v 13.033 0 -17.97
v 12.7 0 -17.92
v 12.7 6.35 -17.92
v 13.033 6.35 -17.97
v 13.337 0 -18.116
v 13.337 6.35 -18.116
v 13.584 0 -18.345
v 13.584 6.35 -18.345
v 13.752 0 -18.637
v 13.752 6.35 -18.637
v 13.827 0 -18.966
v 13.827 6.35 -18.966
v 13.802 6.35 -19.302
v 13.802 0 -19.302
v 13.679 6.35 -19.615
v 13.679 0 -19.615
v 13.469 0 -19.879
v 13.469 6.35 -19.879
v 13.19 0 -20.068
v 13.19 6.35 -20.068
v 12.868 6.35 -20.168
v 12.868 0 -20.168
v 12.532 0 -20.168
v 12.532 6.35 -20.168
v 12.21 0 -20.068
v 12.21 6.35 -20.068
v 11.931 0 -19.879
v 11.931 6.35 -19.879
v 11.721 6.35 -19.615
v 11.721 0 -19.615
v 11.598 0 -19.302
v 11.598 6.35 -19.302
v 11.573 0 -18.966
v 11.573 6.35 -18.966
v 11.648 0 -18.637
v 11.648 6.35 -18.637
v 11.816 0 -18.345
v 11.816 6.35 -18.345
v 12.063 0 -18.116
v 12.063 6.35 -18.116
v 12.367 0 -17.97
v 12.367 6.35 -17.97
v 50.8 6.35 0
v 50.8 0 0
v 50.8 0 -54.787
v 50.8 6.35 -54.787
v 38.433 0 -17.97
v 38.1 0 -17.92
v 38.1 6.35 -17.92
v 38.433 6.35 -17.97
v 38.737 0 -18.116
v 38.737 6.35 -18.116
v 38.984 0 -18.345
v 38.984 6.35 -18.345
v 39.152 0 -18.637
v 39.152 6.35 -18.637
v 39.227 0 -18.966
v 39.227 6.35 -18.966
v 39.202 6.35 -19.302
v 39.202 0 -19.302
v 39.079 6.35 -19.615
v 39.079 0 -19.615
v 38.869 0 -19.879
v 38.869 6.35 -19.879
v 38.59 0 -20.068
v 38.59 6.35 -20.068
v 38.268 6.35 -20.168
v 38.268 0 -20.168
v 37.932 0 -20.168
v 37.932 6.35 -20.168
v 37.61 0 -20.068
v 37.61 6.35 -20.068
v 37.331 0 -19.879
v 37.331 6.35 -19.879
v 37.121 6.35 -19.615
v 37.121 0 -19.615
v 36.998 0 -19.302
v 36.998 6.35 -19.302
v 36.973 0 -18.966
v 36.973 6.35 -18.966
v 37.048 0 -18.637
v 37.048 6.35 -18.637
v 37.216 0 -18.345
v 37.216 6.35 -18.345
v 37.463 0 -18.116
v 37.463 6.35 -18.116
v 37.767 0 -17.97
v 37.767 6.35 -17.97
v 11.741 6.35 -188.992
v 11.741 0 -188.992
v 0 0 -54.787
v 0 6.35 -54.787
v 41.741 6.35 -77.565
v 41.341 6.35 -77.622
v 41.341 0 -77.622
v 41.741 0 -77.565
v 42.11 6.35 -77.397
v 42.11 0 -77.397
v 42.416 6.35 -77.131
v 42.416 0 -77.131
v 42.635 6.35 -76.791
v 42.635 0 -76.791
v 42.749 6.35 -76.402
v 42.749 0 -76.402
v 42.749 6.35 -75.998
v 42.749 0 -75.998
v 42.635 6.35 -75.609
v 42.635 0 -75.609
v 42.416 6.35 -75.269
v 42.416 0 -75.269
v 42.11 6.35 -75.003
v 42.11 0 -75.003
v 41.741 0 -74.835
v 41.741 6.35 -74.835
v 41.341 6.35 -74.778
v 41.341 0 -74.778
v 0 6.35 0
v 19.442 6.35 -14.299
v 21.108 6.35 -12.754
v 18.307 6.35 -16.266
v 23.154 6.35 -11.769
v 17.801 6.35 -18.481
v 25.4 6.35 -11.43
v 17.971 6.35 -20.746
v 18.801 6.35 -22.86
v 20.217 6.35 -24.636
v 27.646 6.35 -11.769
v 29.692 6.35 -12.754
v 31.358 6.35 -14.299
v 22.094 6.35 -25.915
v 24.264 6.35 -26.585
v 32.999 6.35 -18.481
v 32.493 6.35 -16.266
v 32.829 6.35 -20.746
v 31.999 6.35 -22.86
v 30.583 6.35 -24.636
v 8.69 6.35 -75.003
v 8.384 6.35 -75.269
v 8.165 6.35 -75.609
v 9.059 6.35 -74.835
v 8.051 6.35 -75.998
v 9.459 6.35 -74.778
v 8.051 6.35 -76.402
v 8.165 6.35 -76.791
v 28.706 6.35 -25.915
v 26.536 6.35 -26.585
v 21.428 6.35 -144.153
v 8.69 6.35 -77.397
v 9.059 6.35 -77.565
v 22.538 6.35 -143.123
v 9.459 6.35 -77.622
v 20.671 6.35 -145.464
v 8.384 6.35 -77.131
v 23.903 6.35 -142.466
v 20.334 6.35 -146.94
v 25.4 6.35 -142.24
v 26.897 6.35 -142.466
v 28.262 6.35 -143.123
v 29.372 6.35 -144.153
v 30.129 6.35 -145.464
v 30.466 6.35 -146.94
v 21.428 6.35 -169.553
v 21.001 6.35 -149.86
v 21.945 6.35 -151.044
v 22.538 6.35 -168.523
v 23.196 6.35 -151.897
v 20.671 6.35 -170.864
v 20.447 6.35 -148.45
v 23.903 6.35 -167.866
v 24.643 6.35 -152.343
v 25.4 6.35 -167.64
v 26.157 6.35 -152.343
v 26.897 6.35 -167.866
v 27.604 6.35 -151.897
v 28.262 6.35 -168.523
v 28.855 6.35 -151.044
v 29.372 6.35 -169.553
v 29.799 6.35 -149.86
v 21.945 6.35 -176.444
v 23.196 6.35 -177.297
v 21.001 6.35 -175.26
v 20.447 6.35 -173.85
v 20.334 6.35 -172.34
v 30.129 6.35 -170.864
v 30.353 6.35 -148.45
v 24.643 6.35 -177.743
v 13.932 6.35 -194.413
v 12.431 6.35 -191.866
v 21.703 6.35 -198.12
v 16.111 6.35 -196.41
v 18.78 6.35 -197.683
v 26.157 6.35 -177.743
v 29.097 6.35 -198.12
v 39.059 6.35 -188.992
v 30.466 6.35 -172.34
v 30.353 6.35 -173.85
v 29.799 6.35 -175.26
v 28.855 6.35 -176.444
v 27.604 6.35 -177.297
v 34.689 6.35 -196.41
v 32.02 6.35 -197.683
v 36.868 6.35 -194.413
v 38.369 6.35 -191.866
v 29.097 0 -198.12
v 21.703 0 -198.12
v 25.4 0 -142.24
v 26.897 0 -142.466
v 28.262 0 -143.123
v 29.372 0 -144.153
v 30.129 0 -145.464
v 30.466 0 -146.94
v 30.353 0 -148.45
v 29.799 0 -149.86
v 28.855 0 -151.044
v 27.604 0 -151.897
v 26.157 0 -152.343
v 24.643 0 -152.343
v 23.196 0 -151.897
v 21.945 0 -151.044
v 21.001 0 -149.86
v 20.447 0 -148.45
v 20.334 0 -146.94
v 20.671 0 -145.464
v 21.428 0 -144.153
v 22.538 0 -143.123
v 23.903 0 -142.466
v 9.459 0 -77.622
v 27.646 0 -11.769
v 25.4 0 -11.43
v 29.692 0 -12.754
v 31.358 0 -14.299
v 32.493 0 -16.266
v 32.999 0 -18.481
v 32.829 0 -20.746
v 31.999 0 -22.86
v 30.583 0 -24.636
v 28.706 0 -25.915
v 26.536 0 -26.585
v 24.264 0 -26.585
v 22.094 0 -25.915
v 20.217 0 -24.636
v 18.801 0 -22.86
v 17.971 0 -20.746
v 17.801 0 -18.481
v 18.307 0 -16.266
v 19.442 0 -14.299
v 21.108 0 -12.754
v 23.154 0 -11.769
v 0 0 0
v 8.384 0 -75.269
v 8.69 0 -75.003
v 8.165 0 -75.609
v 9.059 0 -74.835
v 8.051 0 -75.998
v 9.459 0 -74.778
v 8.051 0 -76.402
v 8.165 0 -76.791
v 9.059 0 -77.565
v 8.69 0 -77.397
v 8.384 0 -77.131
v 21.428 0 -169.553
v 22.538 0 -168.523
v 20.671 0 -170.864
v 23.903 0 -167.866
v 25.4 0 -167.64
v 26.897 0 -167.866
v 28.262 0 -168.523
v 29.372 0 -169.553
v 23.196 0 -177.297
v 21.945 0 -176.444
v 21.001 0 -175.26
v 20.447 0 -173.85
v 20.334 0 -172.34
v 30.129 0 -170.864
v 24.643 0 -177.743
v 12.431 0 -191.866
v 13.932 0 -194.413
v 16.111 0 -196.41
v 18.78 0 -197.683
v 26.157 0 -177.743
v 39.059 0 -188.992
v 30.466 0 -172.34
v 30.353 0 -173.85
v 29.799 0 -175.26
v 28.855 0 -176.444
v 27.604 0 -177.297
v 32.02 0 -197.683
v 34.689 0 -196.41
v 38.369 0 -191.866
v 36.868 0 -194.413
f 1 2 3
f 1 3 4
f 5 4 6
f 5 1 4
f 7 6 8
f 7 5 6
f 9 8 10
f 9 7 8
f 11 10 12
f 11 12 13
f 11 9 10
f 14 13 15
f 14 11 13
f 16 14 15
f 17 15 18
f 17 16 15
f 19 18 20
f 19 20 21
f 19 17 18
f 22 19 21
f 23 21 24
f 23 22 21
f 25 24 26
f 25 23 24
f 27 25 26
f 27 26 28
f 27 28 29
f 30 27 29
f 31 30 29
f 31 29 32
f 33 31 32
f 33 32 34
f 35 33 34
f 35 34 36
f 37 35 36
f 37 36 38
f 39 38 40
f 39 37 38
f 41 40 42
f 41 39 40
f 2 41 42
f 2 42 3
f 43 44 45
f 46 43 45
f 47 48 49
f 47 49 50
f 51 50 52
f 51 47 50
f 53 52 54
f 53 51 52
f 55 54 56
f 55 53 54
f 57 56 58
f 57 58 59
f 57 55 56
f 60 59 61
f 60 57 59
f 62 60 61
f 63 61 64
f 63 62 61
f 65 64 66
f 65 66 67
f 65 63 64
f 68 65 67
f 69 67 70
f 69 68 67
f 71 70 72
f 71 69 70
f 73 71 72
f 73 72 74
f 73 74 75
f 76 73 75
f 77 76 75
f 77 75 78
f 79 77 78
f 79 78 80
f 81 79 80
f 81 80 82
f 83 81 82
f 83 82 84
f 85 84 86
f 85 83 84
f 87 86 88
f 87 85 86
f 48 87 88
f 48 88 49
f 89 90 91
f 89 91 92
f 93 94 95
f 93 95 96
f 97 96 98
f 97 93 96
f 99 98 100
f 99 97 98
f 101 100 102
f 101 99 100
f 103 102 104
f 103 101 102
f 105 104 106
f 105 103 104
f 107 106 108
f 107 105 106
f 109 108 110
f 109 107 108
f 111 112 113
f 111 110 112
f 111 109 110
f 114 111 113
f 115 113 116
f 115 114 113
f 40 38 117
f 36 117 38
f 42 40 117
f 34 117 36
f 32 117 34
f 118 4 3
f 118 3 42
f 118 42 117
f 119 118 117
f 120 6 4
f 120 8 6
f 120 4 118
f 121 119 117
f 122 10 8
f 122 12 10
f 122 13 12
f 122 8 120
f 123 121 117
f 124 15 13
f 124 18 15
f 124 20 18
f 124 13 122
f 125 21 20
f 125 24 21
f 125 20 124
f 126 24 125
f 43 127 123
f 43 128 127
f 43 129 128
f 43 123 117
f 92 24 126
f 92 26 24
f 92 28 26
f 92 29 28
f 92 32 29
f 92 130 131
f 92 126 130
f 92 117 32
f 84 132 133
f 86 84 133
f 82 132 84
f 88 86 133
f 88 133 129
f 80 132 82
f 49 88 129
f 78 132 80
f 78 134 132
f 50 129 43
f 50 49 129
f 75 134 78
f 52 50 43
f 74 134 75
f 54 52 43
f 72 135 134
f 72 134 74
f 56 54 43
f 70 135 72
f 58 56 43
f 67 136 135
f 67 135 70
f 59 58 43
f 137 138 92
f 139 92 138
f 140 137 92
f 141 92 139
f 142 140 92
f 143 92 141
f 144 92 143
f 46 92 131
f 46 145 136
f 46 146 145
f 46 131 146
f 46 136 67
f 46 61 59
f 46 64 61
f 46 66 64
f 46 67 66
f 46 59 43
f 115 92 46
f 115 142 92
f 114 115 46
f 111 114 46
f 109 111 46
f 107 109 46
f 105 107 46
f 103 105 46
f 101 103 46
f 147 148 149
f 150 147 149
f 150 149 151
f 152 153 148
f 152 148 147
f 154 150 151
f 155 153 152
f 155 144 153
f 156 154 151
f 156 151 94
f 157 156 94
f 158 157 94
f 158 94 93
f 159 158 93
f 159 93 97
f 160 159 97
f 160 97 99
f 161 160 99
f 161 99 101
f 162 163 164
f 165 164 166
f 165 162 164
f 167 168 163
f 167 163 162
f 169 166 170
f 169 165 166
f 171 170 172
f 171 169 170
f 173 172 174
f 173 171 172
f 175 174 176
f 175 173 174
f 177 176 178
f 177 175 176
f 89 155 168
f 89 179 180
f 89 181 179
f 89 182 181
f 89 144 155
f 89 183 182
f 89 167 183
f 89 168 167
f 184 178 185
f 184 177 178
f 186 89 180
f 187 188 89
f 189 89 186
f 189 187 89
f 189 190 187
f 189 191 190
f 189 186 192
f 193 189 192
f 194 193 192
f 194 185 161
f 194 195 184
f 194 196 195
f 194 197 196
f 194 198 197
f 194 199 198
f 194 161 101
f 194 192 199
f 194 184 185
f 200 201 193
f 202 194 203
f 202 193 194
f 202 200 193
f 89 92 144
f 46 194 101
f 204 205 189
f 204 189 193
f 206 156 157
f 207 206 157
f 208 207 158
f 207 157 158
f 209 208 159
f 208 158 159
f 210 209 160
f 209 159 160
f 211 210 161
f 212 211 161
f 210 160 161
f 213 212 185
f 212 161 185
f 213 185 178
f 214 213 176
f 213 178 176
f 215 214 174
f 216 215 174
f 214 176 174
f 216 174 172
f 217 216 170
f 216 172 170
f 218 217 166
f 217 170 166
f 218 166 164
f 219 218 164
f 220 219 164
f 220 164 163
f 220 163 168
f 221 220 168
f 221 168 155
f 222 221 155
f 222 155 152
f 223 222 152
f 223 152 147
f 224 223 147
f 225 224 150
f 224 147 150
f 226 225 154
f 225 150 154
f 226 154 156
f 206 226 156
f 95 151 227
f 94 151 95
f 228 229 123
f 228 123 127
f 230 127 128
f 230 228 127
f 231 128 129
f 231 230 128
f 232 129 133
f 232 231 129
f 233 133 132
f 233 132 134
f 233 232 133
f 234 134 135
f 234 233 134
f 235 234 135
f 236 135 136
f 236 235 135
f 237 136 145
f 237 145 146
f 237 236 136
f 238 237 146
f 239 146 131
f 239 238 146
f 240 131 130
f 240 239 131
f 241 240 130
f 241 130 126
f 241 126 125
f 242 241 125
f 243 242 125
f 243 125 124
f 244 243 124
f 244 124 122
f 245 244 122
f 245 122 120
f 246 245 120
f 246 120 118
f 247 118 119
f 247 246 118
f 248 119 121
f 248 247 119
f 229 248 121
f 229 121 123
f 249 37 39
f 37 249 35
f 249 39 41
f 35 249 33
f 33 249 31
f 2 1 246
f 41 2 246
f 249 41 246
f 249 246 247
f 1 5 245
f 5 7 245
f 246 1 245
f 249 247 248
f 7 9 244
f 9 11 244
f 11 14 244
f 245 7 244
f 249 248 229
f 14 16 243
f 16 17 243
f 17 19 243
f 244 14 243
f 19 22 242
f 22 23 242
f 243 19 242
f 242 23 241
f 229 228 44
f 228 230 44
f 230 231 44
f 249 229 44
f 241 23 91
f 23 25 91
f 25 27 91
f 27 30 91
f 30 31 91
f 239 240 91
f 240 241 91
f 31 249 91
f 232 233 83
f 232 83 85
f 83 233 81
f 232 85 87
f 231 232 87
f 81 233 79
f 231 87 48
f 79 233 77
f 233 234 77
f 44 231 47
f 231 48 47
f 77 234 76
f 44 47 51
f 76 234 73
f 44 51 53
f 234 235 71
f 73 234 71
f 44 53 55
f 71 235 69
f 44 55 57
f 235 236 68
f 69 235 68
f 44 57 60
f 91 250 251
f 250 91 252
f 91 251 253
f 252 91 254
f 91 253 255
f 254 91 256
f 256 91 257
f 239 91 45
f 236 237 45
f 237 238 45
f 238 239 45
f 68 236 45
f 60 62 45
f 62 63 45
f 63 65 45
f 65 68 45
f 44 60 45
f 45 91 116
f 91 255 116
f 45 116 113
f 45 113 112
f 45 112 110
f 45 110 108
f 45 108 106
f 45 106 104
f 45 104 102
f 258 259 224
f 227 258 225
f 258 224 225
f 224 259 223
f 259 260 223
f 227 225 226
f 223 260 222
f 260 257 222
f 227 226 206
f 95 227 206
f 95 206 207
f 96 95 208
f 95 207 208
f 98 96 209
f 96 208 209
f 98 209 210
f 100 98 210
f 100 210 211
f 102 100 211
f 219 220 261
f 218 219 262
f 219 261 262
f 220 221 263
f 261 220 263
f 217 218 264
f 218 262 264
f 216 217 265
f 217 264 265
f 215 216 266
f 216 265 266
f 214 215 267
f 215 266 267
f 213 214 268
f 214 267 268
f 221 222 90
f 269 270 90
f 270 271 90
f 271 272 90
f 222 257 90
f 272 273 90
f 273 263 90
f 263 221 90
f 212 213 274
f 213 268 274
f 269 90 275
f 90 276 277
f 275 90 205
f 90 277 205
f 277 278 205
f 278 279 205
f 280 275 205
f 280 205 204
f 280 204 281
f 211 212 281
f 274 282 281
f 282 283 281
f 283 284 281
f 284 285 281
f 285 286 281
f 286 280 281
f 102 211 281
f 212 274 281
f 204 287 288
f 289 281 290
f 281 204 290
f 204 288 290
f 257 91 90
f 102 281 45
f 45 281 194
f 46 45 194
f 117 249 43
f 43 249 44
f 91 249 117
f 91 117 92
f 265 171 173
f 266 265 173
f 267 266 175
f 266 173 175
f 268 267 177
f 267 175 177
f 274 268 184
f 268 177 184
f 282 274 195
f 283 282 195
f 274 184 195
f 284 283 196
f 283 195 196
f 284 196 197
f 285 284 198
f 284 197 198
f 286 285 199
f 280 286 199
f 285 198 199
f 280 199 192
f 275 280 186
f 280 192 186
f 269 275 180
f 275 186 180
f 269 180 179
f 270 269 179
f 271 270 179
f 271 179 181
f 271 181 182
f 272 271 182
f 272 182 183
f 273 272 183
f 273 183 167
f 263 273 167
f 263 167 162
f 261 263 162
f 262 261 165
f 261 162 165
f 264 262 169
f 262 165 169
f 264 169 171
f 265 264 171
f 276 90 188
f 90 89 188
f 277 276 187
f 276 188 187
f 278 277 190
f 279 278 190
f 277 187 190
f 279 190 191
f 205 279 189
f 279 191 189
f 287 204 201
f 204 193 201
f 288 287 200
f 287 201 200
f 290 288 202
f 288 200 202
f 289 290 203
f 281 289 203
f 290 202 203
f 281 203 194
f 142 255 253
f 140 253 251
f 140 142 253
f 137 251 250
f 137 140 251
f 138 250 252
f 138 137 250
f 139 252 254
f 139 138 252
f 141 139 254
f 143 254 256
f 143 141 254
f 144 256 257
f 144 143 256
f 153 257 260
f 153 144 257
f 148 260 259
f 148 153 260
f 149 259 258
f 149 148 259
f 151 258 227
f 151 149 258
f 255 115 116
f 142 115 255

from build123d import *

# Parameters (mm, degrees)
SKETCH1_W           = 50.8
SKETCH1_H           = 198.12
SKETCH1_R           = 1.1303
SKETCH1_R_2         = 7.62
BOSS_EXTRUDE1_DEPTH = 6.35
SKETCH2_R           = 5.08
CUT_EXTRUDE1_DEPTH  = 6.35
CHAMFER1_SIZE       = 12.54
CHAMFER1_SIZE2      = 143.332855877
FILLET1_R           = 10
CUT_EXTRUDE2_DEPTH  = 10.668


with BuildPart() as part:
    # Sketch1 → Boss-Extrude1 (new body)
    with BuildSketch(Plane(origin=(0, 0, 0), x_dir=(1, 0, 0), z_dir=(0, 1, 0))):
        with Locations((25.4, 99.06)):
            Rectangle(SKETCH1_W, SKETCH1_H)
        with Locations(Location((12.7, 19.05, 0), (0, 0, 270))):
            Circle(SKETCH1_R, mode=Mode.SUBTRACT)
        with Locations(Location((38.1, 19.05, 0), (0, 0, 270))):
            Circle(SKETCH1_R, mode=Mode.SUBTRACT)
        with Locations(Location((25.4, 19.05, 0), (0, 0, 270))):
            Circle(SKETCH1_R_2, mode=Mode.SUBTRACT)
    extrude(amount=BOSS_EXTRUDE1_DEPTH)

    # Sketch2 → Cut-Extrude1 (cut)
    with BuildSketch(Plane(origin=(0, 6.35, 0), x_dir=(1, 0, 0), z_dir=(0, 1, 0))):
        with Locations(Location((25.4, 172.72, 0), (0, 0, 270))):
            Circle(SKETCH2_R)
        with Locations(Location((25.4, 147.32, 0), (0, 0, 270))):
            Circle(SKETCH2_R)
    extrude(amount=-CUT_EXTRUDE1_DEPTH, mode=Mode.SUBTRACT)

    # Chamfer1
    chamfer1_edges = [part.edges().sort_by_distance(p)[0] for p in [
        (0, 3.175, -198.12),
        (50.8, 3.175, -198.12),
    ]]
    chamfer1_side = [part.faces().sort_by_distance(p)[0] for p in [
        (25.4, 3.175, -198.12),
    ]]
    chamfer(chamfer1_edges, length=CHAMFER1_SIZE, length2=CHAMFER1_SIZE2, reference=chamfer1_side[0])

    # Fillet1
    fillet1_edges = [part.edges().sort_by_distance(p)[0] for p in [
        (12.54, 3.175, -198.12),
        (38.26, 3.175, -198.12),
    ]]
    fillet(fillet1_edges, radius=FILLET1_R)

    # Sketch3 → Cut-Extrude2 (cut)
    with BuildSketch(Plane(origin=(0, 6.35, 0), x_dir=(1, 0, 0), z_dir=(0, 1, 0))):
        with BuildLine():
            Line((9.459358265, 77.6224), (41.340641735, 77.6224))
            ThreePointArc((41.340641735, 77.6224), (42.763041735, 76.2), (41.340641735, 74.7776))
            Line((41.340641735, 74.7776), (9.459358265, 74.7776))
            ThreePointArc((9.459358265, 74.7776), (8.036958265, 76.2), (9.459358265, 77.6224))
        make_face()
    extrude(amount=-CUT_EXTRUDE2_DEPTH, mode=Mode.SUBTRACT)


solid = part.part
